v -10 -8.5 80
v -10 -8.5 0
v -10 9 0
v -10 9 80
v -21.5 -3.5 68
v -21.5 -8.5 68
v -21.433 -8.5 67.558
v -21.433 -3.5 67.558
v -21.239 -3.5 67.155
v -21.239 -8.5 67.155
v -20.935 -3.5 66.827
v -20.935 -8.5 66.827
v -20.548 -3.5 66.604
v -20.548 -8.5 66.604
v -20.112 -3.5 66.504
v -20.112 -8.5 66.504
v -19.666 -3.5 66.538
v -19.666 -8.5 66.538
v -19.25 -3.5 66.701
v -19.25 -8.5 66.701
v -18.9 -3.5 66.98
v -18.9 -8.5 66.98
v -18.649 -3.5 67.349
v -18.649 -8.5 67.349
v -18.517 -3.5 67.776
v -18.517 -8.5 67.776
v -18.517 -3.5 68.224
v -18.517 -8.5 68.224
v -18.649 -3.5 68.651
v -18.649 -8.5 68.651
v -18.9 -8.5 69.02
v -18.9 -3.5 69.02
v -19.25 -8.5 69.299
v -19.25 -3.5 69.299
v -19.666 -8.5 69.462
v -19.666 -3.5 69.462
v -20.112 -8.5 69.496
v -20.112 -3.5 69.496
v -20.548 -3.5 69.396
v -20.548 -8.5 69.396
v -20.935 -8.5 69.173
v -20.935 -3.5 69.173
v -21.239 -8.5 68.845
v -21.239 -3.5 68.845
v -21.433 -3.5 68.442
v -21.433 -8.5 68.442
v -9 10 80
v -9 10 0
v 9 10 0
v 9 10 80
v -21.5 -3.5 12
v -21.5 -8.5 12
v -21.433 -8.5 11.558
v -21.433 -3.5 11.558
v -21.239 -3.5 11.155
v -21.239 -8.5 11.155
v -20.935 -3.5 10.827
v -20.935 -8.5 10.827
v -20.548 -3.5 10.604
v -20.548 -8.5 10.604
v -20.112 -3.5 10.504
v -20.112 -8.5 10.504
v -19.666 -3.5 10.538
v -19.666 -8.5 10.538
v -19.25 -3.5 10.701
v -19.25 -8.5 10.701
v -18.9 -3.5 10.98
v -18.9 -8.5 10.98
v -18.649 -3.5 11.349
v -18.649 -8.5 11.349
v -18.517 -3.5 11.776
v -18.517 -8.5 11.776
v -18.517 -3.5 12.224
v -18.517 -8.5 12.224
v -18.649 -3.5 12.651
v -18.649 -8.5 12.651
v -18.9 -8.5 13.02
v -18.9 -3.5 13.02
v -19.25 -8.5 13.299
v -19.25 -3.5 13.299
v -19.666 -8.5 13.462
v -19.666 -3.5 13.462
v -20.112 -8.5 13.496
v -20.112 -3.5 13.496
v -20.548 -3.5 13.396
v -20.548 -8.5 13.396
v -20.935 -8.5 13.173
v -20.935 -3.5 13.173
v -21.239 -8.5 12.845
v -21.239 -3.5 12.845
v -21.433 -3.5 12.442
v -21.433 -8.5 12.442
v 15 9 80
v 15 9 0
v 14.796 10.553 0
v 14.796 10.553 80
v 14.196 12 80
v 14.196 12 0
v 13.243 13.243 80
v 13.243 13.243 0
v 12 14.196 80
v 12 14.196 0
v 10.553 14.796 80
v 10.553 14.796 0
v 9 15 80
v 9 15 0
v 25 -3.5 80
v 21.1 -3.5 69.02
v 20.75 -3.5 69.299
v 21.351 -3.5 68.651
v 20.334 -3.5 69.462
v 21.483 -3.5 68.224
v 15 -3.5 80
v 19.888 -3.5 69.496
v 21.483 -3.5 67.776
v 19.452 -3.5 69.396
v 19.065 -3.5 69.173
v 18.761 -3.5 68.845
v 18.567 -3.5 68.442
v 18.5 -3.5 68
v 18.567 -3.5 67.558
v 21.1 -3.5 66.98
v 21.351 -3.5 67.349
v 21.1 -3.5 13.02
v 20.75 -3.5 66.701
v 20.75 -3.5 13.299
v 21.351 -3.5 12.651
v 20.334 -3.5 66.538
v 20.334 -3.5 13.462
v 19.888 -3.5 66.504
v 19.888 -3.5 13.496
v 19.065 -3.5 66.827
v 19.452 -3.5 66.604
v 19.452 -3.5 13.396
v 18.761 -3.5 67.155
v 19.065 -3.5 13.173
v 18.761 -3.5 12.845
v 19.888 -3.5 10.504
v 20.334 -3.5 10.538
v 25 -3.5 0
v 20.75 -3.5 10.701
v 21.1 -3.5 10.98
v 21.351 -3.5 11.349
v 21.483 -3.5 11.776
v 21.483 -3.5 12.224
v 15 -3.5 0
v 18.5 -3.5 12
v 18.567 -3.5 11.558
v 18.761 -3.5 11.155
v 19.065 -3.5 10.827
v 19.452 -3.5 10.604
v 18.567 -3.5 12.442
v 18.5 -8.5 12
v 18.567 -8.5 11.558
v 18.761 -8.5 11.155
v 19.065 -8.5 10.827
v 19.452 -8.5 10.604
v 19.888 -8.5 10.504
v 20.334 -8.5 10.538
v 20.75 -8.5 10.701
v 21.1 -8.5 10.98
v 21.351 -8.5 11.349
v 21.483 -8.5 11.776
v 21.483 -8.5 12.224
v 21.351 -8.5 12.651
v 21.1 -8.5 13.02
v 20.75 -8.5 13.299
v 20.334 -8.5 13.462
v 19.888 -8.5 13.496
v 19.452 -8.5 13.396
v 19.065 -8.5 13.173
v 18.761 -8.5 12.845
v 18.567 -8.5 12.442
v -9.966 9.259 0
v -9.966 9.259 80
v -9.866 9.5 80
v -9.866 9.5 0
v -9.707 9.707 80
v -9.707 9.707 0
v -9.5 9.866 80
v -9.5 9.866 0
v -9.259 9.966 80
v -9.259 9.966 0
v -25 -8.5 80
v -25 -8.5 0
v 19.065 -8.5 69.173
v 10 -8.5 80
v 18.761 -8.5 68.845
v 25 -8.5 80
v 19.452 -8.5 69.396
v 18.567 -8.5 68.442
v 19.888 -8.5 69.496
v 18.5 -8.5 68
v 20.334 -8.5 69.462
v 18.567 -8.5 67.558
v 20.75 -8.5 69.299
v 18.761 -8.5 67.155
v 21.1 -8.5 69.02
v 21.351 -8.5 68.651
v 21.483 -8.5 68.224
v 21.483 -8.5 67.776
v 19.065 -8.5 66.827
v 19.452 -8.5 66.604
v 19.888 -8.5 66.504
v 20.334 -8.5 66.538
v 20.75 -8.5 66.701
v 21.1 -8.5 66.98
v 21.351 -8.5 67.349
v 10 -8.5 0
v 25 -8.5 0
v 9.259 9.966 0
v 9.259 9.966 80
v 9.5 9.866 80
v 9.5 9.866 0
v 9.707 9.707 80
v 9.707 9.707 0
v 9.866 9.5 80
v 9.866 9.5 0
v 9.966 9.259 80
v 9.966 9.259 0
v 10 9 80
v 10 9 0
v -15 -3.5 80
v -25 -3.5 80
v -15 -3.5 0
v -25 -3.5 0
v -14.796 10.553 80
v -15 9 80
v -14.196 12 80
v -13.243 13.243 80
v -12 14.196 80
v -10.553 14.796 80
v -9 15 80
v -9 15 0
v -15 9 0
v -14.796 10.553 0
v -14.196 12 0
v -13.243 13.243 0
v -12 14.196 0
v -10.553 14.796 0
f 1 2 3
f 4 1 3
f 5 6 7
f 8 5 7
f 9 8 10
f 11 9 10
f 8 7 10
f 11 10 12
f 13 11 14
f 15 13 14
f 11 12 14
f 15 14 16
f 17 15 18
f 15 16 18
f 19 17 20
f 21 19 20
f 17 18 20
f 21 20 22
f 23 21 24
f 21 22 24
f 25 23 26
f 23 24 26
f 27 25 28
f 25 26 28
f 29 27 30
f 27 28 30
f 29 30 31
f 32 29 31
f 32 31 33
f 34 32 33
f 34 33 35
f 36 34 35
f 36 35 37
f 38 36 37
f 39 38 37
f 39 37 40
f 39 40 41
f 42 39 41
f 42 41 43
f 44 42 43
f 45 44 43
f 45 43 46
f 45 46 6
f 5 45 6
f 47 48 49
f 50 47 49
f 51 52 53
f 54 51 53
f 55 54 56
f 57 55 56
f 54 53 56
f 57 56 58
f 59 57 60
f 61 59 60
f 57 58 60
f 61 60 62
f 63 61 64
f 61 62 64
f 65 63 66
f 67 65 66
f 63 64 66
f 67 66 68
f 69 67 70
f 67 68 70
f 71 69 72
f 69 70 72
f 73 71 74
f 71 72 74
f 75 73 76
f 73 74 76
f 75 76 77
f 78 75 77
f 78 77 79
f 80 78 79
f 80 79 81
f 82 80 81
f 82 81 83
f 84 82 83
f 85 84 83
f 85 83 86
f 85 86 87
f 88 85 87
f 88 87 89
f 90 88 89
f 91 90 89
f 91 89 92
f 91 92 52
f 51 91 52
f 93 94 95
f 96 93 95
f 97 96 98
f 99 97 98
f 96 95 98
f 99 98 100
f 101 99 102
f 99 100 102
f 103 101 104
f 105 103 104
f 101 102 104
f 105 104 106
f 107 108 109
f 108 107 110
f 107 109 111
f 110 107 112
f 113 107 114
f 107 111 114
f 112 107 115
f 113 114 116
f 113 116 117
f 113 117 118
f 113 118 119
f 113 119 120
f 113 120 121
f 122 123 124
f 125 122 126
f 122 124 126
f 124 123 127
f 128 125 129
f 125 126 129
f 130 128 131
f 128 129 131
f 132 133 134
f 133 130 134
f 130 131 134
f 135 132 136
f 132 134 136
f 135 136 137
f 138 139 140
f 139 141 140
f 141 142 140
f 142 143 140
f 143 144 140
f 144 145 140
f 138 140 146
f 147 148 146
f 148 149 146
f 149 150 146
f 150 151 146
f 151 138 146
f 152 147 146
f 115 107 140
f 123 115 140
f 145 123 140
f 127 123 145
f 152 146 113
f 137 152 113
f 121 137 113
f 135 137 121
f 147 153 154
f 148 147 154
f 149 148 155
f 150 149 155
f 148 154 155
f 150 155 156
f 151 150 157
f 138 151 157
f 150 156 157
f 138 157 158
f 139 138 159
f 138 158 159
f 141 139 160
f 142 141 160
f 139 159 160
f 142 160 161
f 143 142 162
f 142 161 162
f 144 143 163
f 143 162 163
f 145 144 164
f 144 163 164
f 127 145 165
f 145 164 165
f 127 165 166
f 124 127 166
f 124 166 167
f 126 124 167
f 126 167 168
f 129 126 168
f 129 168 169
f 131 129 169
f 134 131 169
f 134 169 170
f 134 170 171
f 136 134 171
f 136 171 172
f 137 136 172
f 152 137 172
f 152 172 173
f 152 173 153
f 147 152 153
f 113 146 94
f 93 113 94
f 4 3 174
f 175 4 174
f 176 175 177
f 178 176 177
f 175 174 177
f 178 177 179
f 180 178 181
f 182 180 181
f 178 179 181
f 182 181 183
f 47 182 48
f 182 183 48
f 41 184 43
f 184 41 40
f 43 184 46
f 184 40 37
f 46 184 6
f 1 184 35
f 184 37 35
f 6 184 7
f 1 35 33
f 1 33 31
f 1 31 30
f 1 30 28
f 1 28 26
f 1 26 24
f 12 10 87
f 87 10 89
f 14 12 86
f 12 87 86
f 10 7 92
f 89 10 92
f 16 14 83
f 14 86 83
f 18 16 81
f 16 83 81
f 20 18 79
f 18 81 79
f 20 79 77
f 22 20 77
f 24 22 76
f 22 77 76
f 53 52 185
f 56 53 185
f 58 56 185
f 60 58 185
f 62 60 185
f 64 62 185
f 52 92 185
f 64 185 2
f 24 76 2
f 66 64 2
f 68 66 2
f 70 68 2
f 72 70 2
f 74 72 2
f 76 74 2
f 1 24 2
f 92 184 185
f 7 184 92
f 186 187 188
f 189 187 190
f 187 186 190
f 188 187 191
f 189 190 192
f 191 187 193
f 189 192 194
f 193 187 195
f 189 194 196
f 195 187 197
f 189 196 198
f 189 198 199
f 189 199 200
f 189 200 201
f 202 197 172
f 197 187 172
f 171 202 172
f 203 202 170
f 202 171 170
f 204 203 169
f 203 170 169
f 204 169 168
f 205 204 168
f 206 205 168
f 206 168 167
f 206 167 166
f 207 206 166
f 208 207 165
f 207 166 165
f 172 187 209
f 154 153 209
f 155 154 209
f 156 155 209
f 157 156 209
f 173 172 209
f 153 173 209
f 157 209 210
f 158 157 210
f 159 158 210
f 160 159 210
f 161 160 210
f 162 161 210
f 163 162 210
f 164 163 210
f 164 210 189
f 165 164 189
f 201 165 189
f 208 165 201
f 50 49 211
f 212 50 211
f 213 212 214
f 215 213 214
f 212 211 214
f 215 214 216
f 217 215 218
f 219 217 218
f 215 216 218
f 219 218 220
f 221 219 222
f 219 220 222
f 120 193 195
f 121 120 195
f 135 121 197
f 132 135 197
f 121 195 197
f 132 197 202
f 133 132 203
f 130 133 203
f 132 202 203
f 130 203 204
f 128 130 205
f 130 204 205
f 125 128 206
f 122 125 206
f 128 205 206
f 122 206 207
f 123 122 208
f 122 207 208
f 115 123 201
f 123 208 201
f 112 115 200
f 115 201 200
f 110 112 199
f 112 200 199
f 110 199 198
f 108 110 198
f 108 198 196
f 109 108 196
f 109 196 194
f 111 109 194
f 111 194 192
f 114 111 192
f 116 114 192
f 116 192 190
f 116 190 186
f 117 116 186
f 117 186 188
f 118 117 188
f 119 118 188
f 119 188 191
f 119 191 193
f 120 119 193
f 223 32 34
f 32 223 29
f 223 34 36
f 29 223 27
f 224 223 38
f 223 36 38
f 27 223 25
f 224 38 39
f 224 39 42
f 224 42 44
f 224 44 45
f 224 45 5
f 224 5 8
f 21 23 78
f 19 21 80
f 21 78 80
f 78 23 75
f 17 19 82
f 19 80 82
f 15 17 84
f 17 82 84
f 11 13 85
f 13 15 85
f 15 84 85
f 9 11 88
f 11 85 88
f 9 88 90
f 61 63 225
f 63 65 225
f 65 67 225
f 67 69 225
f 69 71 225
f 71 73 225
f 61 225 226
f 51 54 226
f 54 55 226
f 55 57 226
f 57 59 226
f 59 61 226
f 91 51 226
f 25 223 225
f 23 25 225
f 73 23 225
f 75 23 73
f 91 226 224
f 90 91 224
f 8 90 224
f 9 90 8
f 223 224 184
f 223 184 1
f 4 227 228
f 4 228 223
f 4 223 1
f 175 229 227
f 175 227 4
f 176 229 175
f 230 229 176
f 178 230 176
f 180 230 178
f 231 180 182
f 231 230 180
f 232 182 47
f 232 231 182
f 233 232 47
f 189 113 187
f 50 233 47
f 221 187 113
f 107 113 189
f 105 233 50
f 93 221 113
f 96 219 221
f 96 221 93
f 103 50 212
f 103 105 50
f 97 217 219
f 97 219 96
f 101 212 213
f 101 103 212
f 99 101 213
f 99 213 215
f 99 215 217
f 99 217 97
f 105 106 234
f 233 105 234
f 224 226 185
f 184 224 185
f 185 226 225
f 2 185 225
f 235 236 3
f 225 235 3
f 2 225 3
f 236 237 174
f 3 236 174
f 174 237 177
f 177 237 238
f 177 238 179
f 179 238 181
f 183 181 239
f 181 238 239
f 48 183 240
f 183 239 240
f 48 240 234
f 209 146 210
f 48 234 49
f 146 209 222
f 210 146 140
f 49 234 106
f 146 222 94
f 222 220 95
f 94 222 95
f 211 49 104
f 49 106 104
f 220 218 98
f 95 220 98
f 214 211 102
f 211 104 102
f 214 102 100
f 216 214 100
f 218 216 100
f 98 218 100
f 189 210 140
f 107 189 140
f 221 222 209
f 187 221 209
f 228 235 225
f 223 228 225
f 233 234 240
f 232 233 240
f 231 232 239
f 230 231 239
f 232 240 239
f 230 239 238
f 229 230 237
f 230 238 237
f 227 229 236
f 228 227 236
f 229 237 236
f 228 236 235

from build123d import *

# Parameters (mm, degrees)
BOSS_EXTRUDE1_DEPTH   = 80
F_3_0MM_DOWEL_HOLE1_D = 3


with BuildPart() as part:
    # Sketch1 → Boss-Extrude1 (new body)
    with BuildSketch(Plane.XY):
        with BuildLine():
            Line((9, 15), (-9, 15))
            ThreePointArc((-9, 15), (-13.242640687, 13.242640687), (-15, 9))
            Line((-15, 9), (-15, -3.5))
            Line((-15, -3.5), (-25, -3.5))
            Line((-25, -3.5), (-25, -8.5))
            Line((-25, -8.5), (-10, -8.5))
            Line((-10, -8.5), (-10, 9))
            ThreePointArc((-10, 9), (-9.707106781, 9.707106781), (-9, 10))
            Line((-9, 10), (9, 10))
            ThreePointArc((9, 10), (9.707106781, 9.707106781), (10, 9))
            Line((10, 9), (10, -8.5))
            Line((10, -8.5), (25, -8.5))
            Line((25, -8.5), (25, -3.5))
            Line((25, -3.5), (15, -3.5))
            Line((15, -3.5), (15, 9))
            ThreePointArc((15, 9), (13.242640687, 13.242640687), (9, 15))
        make_face()
    extrude(amount=BOSS_EXTRUDE1_DEPTH)

    # Ø3.0mm Dowel Hole1 (through all)
    with Locations(Plane(origin=(0, -3.5, 0), x_dir=(1, 0, 0), z_dir=(0, 1, 0))):
        with Locations((-20, -12), (-20, -68), (20, -12), (20, -68)):
            Hole(F_3_0MM_DOWEL_HOLE1_D / 2)


solid = part.part
